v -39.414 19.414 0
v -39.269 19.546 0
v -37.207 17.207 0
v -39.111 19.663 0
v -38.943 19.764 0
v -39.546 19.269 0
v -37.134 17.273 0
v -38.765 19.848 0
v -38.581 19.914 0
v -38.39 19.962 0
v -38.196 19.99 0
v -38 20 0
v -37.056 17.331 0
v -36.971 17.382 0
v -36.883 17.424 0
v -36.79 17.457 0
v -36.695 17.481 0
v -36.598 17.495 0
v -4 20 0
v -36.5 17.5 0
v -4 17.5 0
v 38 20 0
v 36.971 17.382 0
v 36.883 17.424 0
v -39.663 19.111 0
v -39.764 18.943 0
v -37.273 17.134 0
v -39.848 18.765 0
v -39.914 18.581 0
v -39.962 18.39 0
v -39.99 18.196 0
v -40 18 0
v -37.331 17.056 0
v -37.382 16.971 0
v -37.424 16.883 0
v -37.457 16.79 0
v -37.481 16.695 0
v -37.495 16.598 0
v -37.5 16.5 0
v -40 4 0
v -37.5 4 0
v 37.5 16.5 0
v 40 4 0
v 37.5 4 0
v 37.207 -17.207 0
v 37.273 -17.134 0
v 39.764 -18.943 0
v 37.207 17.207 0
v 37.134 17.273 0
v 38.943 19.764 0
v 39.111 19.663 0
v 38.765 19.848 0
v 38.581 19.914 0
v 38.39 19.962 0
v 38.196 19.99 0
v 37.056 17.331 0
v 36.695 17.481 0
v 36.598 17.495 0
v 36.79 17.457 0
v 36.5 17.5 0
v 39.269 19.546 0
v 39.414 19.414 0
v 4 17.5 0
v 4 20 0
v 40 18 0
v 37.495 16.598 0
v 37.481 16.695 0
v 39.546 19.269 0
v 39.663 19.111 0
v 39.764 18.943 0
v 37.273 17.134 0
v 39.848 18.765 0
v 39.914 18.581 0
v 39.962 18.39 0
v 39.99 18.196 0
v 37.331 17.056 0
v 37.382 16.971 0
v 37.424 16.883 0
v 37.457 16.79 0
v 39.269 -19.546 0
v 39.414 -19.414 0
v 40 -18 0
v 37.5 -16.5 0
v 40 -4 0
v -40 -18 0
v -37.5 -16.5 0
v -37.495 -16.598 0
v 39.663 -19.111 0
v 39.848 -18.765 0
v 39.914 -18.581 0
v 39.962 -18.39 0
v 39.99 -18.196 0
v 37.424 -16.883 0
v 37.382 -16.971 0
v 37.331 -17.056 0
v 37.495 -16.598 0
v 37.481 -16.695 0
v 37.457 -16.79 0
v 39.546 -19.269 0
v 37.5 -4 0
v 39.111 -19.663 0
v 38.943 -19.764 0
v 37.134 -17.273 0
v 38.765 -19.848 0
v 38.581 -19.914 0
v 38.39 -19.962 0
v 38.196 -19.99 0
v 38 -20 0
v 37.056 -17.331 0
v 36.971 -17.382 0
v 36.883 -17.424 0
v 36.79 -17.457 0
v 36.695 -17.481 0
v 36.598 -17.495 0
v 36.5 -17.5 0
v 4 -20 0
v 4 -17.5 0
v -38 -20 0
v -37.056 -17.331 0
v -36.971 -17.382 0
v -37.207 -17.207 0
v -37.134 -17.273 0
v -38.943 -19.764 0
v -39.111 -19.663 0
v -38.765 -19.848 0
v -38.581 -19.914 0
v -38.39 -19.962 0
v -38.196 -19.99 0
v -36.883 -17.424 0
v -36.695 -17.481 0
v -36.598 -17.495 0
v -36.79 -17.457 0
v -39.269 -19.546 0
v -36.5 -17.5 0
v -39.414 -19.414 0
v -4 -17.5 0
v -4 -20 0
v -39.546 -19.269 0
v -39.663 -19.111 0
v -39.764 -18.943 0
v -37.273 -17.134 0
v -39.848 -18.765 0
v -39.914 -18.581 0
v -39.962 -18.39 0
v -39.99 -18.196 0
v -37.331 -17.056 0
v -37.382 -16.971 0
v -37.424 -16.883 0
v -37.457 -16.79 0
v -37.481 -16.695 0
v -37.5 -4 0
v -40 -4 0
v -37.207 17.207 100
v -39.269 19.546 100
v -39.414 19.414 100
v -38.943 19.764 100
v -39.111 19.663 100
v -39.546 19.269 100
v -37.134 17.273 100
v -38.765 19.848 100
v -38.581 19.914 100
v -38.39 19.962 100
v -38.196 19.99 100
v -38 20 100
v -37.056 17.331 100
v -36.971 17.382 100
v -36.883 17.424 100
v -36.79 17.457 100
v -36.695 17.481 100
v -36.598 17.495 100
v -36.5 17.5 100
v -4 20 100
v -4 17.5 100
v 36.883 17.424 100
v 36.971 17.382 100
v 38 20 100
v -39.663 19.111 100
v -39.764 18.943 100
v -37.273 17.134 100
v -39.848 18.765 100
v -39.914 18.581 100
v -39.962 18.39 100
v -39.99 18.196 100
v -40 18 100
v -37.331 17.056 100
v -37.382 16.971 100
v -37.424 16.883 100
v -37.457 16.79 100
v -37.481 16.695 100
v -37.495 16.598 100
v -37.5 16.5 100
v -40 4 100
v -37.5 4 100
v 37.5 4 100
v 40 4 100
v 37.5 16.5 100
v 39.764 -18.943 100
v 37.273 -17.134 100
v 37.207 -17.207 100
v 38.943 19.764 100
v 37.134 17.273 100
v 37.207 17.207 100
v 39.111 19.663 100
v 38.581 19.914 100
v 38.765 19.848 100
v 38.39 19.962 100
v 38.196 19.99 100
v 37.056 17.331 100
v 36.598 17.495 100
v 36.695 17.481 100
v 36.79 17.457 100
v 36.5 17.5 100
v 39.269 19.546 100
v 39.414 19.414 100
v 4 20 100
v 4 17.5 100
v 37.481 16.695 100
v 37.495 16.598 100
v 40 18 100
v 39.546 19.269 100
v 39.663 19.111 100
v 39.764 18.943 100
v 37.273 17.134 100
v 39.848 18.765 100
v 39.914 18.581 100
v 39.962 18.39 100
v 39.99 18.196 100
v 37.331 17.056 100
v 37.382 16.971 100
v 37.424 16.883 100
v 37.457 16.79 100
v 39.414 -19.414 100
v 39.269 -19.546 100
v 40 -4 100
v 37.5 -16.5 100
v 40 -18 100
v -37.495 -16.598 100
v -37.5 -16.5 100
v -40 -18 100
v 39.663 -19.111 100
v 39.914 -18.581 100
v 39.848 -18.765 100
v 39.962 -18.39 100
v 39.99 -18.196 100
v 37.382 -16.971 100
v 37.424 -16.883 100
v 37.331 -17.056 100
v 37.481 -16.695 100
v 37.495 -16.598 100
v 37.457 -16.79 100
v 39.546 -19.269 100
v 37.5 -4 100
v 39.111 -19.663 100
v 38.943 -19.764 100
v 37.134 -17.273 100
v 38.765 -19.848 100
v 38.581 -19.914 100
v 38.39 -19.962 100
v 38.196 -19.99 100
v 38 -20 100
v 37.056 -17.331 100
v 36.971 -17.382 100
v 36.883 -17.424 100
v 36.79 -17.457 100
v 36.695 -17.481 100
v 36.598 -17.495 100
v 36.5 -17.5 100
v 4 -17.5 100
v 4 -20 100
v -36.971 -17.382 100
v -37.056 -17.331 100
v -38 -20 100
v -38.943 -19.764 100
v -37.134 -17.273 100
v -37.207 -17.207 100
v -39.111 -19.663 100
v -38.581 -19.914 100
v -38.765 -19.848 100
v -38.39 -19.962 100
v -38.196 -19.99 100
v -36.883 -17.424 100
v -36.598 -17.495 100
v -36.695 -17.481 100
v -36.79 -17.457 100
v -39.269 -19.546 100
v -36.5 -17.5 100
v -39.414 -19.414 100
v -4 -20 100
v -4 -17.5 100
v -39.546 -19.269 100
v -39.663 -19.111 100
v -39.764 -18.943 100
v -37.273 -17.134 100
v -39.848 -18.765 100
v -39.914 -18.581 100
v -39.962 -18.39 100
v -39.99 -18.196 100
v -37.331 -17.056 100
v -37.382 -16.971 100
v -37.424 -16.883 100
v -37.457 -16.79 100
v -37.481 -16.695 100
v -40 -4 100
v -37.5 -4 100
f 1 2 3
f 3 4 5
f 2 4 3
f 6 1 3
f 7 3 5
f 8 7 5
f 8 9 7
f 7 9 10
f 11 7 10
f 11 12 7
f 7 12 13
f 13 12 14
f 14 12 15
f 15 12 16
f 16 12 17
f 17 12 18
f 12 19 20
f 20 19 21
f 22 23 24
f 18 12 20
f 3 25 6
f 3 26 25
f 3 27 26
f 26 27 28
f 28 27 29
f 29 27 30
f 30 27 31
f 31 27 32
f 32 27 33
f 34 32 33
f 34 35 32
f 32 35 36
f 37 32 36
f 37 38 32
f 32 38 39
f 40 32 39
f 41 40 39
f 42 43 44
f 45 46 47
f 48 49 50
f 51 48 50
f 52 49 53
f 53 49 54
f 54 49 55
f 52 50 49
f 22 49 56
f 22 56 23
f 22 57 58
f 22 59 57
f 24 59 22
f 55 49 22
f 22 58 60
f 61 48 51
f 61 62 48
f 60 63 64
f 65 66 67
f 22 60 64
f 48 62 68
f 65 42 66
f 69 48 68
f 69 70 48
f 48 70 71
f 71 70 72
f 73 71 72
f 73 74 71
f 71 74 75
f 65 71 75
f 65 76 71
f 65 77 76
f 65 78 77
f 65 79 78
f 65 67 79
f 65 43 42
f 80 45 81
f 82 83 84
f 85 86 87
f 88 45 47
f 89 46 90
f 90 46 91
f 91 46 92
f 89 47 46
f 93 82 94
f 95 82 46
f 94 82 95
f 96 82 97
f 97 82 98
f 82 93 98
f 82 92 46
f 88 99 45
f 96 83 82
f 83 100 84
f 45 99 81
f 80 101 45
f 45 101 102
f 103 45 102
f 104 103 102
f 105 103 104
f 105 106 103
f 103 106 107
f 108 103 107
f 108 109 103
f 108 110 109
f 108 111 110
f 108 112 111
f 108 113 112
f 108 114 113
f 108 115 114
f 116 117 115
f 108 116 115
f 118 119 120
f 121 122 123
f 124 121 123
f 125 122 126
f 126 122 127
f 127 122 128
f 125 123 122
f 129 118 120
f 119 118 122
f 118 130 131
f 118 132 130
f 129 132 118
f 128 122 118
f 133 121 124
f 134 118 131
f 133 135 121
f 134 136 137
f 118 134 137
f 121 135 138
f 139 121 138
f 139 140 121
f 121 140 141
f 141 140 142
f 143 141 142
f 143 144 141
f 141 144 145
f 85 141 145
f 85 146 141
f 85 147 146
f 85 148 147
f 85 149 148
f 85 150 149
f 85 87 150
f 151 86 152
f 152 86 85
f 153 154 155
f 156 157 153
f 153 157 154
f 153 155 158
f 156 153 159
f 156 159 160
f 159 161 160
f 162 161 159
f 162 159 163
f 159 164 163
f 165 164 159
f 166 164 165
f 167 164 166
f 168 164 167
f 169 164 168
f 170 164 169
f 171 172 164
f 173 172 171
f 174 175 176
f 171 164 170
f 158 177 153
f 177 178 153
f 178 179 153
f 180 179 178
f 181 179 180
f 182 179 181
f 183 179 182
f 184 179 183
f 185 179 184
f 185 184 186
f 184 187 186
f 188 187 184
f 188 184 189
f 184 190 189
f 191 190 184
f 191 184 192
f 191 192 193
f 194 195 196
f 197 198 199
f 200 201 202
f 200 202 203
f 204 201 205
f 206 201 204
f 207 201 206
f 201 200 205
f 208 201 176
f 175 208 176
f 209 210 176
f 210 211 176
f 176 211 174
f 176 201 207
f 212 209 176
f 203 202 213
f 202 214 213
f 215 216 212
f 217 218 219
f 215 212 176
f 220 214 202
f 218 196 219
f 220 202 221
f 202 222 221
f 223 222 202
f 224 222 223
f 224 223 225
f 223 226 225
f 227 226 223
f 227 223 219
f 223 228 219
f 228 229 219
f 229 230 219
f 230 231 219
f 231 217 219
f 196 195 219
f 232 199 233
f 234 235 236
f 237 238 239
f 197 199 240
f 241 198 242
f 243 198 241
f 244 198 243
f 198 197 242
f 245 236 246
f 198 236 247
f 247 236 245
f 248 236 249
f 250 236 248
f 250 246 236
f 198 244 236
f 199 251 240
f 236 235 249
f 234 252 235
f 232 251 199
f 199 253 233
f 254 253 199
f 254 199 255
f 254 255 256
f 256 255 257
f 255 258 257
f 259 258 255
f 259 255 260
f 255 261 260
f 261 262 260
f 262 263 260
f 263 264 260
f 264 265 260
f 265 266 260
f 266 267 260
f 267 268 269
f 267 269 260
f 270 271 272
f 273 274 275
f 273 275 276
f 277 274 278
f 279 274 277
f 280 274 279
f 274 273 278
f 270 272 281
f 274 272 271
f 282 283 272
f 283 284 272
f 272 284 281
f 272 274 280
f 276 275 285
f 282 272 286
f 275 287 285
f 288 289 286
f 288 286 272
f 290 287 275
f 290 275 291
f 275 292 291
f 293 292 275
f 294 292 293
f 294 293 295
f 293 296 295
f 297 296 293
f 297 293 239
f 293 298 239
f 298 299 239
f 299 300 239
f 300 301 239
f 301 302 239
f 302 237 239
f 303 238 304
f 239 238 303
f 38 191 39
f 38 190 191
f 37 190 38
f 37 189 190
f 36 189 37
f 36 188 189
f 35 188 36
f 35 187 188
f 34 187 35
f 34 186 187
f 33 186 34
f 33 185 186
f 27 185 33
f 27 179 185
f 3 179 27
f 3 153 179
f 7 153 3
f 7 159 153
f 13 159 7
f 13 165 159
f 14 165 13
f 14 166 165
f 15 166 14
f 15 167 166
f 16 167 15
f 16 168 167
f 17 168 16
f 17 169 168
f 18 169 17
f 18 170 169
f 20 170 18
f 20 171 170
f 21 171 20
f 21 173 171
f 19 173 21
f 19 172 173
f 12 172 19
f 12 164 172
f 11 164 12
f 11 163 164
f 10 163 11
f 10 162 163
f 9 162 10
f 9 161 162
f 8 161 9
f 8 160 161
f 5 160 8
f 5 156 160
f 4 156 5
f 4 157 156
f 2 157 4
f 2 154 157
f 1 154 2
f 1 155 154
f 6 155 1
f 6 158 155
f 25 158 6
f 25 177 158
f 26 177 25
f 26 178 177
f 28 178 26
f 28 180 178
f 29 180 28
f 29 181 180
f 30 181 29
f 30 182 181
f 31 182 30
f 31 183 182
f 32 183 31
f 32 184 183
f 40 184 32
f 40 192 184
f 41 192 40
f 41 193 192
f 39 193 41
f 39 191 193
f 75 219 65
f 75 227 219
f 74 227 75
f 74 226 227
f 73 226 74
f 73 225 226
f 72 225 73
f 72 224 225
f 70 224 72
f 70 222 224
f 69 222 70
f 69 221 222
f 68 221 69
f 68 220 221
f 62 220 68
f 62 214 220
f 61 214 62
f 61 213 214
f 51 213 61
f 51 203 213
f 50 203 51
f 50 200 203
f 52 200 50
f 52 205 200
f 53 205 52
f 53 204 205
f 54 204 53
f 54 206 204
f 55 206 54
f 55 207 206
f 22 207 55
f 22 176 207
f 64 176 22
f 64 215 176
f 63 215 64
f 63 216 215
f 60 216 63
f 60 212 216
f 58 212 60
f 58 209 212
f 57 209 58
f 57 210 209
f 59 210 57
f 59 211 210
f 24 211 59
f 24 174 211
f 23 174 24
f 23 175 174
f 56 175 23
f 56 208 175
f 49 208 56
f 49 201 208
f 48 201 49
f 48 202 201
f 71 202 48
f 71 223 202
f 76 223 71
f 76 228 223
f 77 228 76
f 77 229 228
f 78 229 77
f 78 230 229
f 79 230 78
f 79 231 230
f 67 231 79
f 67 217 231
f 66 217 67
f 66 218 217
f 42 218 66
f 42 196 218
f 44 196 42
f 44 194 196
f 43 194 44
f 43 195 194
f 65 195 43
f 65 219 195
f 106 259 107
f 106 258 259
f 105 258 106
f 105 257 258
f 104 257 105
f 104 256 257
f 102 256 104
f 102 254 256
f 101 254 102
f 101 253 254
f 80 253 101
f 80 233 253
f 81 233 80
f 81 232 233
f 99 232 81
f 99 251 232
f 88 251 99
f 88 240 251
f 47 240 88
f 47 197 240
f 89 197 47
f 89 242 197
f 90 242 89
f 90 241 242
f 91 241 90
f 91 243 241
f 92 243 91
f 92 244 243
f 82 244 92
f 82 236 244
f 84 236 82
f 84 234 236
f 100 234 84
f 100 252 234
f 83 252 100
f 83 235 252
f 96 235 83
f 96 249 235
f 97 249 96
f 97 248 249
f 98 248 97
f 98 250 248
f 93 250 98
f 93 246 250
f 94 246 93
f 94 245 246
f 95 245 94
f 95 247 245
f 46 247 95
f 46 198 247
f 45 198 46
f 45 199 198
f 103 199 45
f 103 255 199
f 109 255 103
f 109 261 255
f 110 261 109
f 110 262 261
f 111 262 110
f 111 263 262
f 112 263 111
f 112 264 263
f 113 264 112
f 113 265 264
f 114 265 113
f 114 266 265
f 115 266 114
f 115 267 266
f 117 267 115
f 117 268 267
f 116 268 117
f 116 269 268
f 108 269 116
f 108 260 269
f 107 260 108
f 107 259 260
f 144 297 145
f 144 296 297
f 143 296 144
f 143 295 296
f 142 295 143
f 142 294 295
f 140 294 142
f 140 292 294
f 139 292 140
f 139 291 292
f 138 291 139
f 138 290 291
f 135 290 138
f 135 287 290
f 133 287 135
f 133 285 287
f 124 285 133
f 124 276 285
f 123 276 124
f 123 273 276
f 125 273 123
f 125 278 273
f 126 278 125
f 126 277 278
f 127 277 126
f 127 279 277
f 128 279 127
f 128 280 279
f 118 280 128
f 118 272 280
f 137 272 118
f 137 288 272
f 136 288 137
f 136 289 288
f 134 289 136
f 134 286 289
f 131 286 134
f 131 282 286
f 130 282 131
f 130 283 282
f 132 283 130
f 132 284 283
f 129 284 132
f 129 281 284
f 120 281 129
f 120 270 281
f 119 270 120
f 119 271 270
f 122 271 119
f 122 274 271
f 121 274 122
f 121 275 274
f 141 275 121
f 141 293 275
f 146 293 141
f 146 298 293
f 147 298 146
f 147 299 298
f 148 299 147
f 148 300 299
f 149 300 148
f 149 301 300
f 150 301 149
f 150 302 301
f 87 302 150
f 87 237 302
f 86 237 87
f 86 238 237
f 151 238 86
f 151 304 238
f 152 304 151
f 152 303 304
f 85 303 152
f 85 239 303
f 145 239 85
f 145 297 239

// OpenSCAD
$fn = 64;

length = 100;
w = 80;
h = 40;

wall = 2.5;
slot_w = 8;
slot_depth = 6;
corner_r = 2;

module rounded_rect_2d(w, h, r) {
    r2 = min(r, min(w, h)/2);
    hull() {
        translate([ w/2 - r2,  h/2 - r2]) circle(r=r2);
        translate([-w/2 + r2,  h/2 - r2]) circle(r=r2);
        translate([ w/2 - r2, -h/2 + r2]) circle(r=r2);
        translate([-w/2 + r2, -h/2 + r2]) circle(r=r2);
    }
}

module extrusion_4080_profile_2d() {
    difference() {
        // Outer body
        rounded_rect_2d(w, h, corner_r);

        // Inner hollow
        rounded_rect_2d(w - 2*wall, h - 2*wall, max(0, corner_r - 1));

        // T-slots (approximate) on all four sides
        // Top
        translate([0, h/2 - slot_depth/2])
            square([slot_w, slot_depth], center=true);

        // Bottom
        translate([0, -h/2 + slot_depth/2])
            square([slot_w, slot_depth], center=true);

        // Left
        translate([-w/2 + slot_depth/2, 0])
            rotate(90) square([slot_w, slot_depth], center=true);

        // Right
        translate([ w/2 - slot_depth/2, 0])
            rotate(90) square([slot_w, slot_depth], center=true);

        // Central bore (approximate)
        circle(d=10);
    }
}

linear_extrude(height=length, center=false, convexity=10)
    extrusion_4080_profile_2d();
